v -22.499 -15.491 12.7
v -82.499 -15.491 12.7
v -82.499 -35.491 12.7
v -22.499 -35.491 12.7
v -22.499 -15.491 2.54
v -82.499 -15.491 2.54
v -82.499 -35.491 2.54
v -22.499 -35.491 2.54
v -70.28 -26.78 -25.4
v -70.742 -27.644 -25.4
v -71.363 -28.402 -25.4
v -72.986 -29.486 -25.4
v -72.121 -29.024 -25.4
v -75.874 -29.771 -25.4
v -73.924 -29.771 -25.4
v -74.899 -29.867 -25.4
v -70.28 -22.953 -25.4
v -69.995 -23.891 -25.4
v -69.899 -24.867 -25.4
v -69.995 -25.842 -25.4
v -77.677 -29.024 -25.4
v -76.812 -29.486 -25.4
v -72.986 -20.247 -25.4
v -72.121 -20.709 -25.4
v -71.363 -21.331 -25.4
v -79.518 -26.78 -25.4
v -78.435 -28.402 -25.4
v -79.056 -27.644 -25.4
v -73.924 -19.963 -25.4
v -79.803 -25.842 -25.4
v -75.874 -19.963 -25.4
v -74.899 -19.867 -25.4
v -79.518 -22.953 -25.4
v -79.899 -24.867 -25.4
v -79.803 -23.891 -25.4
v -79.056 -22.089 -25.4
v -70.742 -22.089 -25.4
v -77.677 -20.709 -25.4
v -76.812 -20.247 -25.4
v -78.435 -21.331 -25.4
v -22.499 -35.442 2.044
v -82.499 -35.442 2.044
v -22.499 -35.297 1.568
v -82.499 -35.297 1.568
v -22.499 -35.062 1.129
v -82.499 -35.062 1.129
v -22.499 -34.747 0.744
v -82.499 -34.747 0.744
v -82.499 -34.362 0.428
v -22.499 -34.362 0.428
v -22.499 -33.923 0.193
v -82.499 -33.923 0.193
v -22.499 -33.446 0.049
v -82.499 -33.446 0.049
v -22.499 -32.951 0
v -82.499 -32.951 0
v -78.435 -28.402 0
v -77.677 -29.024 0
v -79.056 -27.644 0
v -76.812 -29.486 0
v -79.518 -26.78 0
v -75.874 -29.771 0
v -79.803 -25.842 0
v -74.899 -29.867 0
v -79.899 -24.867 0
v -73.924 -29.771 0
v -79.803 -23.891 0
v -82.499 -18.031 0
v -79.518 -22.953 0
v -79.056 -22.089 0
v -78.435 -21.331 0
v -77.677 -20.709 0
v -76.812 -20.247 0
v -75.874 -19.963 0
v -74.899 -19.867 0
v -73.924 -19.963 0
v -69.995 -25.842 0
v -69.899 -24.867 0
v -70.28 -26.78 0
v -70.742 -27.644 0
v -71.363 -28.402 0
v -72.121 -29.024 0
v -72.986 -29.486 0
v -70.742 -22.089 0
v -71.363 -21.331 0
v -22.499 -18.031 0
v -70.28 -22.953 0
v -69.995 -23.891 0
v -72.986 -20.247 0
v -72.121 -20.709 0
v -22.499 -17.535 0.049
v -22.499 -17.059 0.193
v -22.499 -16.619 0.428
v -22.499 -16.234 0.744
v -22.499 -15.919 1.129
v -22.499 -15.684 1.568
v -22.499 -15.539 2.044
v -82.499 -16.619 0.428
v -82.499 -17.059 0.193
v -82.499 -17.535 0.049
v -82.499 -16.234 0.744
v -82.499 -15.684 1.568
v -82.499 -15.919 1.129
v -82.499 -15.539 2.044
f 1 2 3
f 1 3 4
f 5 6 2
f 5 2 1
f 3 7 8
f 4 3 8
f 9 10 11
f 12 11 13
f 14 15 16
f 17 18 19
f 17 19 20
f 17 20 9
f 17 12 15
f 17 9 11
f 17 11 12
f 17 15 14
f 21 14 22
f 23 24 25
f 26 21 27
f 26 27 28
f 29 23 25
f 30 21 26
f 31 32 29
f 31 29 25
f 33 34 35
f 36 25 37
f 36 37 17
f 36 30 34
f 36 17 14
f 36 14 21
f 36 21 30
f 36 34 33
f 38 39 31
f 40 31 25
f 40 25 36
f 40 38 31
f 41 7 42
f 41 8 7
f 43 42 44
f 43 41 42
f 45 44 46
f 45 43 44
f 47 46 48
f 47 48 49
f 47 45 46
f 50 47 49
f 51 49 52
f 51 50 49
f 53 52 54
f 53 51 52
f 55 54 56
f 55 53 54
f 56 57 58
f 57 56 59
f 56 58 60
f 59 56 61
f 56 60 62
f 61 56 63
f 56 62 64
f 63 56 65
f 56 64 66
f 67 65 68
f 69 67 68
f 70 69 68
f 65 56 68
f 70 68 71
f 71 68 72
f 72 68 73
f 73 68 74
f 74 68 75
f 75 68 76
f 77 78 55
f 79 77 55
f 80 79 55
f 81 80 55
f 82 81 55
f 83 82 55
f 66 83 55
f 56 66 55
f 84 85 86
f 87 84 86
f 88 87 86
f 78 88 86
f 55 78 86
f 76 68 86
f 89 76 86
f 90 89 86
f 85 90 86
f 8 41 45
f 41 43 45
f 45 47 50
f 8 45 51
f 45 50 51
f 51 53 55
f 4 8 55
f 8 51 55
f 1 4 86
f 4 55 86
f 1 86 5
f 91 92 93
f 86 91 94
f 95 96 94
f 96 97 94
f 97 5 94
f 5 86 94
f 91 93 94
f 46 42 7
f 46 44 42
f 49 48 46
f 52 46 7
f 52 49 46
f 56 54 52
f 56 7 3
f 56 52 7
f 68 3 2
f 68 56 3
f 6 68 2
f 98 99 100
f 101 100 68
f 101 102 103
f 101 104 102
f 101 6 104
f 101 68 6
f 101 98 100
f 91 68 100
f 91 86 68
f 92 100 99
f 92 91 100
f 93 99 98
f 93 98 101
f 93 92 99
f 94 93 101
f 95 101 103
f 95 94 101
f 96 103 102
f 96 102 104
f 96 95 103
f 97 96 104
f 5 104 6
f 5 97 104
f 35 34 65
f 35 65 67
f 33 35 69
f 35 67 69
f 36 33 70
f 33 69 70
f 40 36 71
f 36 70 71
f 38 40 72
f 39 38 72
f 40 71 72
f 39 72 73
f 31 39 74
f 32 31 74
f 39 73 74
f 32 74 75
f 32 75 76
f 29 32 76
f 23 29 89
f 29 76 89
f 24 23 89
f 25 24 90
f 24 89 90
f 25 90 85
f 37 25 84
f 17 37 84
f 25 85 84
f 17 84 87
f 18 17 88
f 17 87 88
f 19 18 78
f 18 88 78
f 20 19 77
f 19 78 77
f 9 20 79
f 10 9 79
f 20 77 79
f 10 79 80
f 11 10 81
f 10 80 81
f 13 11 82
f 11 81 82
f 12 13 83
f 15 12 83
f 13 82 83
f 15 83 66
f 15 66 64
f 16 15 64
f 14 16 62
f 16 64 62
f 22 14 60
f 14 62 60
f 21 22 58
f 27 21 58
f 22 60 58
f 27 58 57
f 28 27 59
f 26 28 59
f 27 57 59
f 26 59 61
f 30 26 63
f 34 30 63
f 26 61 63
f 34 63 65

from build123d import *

# Parameters (mm, degrees)
SKETCH1_W           = 60
SKETCH1_H           = 20
BOSS_EXTRUDE2_DEPTH = 12.7
FILLET1_R           = 2.54
FILLET2_R           = 2.54
SKETCH2_R           = 5
BOSS_EXTRUDE3_DEPTH = 25.4


with BuildPart() as part:
    # Sketch1 → Boss-Extrude2 (new body)
    with BuildSketch(Plane.XY):
        with Locations((-52.498731257, -25.490525622)):
            Rectangle(SKETCH1_W, SKETCH1_H)
    extrude(amount=BOSS_EXTRUDE2_DEPTH)

    # Fillet1
    fillet1_edges = [part.edges().sort_by_distance(p)[0] for p in [
        (-52.498731257, -35.490525622, 0),
    ]]
    fillet(fillet1_edges, radius=FILLET1_R)

    # Fillet2
    fillet2_edges = [part.edges().sort_by_distance(p)[0] for p in [
        (-52.498731257, -15.490525622, 0),
    ]]
    fillet(fillet2_edges, radius=FILLET2_R)

    # Sketch2 → Boss-Extrude3 (add)
    with BuildSketch(Plane(origin=(0, 0, 0), x_dir=(-1, 0, 0), z_dir=(0, 0, -1))):
        with Locations((74.89901914, -24.866644028)):
            Circle(SKETCH2_R)
    extrude(amount=BOSS_EXTRUDE3_DEPTH)


solid = part.part
